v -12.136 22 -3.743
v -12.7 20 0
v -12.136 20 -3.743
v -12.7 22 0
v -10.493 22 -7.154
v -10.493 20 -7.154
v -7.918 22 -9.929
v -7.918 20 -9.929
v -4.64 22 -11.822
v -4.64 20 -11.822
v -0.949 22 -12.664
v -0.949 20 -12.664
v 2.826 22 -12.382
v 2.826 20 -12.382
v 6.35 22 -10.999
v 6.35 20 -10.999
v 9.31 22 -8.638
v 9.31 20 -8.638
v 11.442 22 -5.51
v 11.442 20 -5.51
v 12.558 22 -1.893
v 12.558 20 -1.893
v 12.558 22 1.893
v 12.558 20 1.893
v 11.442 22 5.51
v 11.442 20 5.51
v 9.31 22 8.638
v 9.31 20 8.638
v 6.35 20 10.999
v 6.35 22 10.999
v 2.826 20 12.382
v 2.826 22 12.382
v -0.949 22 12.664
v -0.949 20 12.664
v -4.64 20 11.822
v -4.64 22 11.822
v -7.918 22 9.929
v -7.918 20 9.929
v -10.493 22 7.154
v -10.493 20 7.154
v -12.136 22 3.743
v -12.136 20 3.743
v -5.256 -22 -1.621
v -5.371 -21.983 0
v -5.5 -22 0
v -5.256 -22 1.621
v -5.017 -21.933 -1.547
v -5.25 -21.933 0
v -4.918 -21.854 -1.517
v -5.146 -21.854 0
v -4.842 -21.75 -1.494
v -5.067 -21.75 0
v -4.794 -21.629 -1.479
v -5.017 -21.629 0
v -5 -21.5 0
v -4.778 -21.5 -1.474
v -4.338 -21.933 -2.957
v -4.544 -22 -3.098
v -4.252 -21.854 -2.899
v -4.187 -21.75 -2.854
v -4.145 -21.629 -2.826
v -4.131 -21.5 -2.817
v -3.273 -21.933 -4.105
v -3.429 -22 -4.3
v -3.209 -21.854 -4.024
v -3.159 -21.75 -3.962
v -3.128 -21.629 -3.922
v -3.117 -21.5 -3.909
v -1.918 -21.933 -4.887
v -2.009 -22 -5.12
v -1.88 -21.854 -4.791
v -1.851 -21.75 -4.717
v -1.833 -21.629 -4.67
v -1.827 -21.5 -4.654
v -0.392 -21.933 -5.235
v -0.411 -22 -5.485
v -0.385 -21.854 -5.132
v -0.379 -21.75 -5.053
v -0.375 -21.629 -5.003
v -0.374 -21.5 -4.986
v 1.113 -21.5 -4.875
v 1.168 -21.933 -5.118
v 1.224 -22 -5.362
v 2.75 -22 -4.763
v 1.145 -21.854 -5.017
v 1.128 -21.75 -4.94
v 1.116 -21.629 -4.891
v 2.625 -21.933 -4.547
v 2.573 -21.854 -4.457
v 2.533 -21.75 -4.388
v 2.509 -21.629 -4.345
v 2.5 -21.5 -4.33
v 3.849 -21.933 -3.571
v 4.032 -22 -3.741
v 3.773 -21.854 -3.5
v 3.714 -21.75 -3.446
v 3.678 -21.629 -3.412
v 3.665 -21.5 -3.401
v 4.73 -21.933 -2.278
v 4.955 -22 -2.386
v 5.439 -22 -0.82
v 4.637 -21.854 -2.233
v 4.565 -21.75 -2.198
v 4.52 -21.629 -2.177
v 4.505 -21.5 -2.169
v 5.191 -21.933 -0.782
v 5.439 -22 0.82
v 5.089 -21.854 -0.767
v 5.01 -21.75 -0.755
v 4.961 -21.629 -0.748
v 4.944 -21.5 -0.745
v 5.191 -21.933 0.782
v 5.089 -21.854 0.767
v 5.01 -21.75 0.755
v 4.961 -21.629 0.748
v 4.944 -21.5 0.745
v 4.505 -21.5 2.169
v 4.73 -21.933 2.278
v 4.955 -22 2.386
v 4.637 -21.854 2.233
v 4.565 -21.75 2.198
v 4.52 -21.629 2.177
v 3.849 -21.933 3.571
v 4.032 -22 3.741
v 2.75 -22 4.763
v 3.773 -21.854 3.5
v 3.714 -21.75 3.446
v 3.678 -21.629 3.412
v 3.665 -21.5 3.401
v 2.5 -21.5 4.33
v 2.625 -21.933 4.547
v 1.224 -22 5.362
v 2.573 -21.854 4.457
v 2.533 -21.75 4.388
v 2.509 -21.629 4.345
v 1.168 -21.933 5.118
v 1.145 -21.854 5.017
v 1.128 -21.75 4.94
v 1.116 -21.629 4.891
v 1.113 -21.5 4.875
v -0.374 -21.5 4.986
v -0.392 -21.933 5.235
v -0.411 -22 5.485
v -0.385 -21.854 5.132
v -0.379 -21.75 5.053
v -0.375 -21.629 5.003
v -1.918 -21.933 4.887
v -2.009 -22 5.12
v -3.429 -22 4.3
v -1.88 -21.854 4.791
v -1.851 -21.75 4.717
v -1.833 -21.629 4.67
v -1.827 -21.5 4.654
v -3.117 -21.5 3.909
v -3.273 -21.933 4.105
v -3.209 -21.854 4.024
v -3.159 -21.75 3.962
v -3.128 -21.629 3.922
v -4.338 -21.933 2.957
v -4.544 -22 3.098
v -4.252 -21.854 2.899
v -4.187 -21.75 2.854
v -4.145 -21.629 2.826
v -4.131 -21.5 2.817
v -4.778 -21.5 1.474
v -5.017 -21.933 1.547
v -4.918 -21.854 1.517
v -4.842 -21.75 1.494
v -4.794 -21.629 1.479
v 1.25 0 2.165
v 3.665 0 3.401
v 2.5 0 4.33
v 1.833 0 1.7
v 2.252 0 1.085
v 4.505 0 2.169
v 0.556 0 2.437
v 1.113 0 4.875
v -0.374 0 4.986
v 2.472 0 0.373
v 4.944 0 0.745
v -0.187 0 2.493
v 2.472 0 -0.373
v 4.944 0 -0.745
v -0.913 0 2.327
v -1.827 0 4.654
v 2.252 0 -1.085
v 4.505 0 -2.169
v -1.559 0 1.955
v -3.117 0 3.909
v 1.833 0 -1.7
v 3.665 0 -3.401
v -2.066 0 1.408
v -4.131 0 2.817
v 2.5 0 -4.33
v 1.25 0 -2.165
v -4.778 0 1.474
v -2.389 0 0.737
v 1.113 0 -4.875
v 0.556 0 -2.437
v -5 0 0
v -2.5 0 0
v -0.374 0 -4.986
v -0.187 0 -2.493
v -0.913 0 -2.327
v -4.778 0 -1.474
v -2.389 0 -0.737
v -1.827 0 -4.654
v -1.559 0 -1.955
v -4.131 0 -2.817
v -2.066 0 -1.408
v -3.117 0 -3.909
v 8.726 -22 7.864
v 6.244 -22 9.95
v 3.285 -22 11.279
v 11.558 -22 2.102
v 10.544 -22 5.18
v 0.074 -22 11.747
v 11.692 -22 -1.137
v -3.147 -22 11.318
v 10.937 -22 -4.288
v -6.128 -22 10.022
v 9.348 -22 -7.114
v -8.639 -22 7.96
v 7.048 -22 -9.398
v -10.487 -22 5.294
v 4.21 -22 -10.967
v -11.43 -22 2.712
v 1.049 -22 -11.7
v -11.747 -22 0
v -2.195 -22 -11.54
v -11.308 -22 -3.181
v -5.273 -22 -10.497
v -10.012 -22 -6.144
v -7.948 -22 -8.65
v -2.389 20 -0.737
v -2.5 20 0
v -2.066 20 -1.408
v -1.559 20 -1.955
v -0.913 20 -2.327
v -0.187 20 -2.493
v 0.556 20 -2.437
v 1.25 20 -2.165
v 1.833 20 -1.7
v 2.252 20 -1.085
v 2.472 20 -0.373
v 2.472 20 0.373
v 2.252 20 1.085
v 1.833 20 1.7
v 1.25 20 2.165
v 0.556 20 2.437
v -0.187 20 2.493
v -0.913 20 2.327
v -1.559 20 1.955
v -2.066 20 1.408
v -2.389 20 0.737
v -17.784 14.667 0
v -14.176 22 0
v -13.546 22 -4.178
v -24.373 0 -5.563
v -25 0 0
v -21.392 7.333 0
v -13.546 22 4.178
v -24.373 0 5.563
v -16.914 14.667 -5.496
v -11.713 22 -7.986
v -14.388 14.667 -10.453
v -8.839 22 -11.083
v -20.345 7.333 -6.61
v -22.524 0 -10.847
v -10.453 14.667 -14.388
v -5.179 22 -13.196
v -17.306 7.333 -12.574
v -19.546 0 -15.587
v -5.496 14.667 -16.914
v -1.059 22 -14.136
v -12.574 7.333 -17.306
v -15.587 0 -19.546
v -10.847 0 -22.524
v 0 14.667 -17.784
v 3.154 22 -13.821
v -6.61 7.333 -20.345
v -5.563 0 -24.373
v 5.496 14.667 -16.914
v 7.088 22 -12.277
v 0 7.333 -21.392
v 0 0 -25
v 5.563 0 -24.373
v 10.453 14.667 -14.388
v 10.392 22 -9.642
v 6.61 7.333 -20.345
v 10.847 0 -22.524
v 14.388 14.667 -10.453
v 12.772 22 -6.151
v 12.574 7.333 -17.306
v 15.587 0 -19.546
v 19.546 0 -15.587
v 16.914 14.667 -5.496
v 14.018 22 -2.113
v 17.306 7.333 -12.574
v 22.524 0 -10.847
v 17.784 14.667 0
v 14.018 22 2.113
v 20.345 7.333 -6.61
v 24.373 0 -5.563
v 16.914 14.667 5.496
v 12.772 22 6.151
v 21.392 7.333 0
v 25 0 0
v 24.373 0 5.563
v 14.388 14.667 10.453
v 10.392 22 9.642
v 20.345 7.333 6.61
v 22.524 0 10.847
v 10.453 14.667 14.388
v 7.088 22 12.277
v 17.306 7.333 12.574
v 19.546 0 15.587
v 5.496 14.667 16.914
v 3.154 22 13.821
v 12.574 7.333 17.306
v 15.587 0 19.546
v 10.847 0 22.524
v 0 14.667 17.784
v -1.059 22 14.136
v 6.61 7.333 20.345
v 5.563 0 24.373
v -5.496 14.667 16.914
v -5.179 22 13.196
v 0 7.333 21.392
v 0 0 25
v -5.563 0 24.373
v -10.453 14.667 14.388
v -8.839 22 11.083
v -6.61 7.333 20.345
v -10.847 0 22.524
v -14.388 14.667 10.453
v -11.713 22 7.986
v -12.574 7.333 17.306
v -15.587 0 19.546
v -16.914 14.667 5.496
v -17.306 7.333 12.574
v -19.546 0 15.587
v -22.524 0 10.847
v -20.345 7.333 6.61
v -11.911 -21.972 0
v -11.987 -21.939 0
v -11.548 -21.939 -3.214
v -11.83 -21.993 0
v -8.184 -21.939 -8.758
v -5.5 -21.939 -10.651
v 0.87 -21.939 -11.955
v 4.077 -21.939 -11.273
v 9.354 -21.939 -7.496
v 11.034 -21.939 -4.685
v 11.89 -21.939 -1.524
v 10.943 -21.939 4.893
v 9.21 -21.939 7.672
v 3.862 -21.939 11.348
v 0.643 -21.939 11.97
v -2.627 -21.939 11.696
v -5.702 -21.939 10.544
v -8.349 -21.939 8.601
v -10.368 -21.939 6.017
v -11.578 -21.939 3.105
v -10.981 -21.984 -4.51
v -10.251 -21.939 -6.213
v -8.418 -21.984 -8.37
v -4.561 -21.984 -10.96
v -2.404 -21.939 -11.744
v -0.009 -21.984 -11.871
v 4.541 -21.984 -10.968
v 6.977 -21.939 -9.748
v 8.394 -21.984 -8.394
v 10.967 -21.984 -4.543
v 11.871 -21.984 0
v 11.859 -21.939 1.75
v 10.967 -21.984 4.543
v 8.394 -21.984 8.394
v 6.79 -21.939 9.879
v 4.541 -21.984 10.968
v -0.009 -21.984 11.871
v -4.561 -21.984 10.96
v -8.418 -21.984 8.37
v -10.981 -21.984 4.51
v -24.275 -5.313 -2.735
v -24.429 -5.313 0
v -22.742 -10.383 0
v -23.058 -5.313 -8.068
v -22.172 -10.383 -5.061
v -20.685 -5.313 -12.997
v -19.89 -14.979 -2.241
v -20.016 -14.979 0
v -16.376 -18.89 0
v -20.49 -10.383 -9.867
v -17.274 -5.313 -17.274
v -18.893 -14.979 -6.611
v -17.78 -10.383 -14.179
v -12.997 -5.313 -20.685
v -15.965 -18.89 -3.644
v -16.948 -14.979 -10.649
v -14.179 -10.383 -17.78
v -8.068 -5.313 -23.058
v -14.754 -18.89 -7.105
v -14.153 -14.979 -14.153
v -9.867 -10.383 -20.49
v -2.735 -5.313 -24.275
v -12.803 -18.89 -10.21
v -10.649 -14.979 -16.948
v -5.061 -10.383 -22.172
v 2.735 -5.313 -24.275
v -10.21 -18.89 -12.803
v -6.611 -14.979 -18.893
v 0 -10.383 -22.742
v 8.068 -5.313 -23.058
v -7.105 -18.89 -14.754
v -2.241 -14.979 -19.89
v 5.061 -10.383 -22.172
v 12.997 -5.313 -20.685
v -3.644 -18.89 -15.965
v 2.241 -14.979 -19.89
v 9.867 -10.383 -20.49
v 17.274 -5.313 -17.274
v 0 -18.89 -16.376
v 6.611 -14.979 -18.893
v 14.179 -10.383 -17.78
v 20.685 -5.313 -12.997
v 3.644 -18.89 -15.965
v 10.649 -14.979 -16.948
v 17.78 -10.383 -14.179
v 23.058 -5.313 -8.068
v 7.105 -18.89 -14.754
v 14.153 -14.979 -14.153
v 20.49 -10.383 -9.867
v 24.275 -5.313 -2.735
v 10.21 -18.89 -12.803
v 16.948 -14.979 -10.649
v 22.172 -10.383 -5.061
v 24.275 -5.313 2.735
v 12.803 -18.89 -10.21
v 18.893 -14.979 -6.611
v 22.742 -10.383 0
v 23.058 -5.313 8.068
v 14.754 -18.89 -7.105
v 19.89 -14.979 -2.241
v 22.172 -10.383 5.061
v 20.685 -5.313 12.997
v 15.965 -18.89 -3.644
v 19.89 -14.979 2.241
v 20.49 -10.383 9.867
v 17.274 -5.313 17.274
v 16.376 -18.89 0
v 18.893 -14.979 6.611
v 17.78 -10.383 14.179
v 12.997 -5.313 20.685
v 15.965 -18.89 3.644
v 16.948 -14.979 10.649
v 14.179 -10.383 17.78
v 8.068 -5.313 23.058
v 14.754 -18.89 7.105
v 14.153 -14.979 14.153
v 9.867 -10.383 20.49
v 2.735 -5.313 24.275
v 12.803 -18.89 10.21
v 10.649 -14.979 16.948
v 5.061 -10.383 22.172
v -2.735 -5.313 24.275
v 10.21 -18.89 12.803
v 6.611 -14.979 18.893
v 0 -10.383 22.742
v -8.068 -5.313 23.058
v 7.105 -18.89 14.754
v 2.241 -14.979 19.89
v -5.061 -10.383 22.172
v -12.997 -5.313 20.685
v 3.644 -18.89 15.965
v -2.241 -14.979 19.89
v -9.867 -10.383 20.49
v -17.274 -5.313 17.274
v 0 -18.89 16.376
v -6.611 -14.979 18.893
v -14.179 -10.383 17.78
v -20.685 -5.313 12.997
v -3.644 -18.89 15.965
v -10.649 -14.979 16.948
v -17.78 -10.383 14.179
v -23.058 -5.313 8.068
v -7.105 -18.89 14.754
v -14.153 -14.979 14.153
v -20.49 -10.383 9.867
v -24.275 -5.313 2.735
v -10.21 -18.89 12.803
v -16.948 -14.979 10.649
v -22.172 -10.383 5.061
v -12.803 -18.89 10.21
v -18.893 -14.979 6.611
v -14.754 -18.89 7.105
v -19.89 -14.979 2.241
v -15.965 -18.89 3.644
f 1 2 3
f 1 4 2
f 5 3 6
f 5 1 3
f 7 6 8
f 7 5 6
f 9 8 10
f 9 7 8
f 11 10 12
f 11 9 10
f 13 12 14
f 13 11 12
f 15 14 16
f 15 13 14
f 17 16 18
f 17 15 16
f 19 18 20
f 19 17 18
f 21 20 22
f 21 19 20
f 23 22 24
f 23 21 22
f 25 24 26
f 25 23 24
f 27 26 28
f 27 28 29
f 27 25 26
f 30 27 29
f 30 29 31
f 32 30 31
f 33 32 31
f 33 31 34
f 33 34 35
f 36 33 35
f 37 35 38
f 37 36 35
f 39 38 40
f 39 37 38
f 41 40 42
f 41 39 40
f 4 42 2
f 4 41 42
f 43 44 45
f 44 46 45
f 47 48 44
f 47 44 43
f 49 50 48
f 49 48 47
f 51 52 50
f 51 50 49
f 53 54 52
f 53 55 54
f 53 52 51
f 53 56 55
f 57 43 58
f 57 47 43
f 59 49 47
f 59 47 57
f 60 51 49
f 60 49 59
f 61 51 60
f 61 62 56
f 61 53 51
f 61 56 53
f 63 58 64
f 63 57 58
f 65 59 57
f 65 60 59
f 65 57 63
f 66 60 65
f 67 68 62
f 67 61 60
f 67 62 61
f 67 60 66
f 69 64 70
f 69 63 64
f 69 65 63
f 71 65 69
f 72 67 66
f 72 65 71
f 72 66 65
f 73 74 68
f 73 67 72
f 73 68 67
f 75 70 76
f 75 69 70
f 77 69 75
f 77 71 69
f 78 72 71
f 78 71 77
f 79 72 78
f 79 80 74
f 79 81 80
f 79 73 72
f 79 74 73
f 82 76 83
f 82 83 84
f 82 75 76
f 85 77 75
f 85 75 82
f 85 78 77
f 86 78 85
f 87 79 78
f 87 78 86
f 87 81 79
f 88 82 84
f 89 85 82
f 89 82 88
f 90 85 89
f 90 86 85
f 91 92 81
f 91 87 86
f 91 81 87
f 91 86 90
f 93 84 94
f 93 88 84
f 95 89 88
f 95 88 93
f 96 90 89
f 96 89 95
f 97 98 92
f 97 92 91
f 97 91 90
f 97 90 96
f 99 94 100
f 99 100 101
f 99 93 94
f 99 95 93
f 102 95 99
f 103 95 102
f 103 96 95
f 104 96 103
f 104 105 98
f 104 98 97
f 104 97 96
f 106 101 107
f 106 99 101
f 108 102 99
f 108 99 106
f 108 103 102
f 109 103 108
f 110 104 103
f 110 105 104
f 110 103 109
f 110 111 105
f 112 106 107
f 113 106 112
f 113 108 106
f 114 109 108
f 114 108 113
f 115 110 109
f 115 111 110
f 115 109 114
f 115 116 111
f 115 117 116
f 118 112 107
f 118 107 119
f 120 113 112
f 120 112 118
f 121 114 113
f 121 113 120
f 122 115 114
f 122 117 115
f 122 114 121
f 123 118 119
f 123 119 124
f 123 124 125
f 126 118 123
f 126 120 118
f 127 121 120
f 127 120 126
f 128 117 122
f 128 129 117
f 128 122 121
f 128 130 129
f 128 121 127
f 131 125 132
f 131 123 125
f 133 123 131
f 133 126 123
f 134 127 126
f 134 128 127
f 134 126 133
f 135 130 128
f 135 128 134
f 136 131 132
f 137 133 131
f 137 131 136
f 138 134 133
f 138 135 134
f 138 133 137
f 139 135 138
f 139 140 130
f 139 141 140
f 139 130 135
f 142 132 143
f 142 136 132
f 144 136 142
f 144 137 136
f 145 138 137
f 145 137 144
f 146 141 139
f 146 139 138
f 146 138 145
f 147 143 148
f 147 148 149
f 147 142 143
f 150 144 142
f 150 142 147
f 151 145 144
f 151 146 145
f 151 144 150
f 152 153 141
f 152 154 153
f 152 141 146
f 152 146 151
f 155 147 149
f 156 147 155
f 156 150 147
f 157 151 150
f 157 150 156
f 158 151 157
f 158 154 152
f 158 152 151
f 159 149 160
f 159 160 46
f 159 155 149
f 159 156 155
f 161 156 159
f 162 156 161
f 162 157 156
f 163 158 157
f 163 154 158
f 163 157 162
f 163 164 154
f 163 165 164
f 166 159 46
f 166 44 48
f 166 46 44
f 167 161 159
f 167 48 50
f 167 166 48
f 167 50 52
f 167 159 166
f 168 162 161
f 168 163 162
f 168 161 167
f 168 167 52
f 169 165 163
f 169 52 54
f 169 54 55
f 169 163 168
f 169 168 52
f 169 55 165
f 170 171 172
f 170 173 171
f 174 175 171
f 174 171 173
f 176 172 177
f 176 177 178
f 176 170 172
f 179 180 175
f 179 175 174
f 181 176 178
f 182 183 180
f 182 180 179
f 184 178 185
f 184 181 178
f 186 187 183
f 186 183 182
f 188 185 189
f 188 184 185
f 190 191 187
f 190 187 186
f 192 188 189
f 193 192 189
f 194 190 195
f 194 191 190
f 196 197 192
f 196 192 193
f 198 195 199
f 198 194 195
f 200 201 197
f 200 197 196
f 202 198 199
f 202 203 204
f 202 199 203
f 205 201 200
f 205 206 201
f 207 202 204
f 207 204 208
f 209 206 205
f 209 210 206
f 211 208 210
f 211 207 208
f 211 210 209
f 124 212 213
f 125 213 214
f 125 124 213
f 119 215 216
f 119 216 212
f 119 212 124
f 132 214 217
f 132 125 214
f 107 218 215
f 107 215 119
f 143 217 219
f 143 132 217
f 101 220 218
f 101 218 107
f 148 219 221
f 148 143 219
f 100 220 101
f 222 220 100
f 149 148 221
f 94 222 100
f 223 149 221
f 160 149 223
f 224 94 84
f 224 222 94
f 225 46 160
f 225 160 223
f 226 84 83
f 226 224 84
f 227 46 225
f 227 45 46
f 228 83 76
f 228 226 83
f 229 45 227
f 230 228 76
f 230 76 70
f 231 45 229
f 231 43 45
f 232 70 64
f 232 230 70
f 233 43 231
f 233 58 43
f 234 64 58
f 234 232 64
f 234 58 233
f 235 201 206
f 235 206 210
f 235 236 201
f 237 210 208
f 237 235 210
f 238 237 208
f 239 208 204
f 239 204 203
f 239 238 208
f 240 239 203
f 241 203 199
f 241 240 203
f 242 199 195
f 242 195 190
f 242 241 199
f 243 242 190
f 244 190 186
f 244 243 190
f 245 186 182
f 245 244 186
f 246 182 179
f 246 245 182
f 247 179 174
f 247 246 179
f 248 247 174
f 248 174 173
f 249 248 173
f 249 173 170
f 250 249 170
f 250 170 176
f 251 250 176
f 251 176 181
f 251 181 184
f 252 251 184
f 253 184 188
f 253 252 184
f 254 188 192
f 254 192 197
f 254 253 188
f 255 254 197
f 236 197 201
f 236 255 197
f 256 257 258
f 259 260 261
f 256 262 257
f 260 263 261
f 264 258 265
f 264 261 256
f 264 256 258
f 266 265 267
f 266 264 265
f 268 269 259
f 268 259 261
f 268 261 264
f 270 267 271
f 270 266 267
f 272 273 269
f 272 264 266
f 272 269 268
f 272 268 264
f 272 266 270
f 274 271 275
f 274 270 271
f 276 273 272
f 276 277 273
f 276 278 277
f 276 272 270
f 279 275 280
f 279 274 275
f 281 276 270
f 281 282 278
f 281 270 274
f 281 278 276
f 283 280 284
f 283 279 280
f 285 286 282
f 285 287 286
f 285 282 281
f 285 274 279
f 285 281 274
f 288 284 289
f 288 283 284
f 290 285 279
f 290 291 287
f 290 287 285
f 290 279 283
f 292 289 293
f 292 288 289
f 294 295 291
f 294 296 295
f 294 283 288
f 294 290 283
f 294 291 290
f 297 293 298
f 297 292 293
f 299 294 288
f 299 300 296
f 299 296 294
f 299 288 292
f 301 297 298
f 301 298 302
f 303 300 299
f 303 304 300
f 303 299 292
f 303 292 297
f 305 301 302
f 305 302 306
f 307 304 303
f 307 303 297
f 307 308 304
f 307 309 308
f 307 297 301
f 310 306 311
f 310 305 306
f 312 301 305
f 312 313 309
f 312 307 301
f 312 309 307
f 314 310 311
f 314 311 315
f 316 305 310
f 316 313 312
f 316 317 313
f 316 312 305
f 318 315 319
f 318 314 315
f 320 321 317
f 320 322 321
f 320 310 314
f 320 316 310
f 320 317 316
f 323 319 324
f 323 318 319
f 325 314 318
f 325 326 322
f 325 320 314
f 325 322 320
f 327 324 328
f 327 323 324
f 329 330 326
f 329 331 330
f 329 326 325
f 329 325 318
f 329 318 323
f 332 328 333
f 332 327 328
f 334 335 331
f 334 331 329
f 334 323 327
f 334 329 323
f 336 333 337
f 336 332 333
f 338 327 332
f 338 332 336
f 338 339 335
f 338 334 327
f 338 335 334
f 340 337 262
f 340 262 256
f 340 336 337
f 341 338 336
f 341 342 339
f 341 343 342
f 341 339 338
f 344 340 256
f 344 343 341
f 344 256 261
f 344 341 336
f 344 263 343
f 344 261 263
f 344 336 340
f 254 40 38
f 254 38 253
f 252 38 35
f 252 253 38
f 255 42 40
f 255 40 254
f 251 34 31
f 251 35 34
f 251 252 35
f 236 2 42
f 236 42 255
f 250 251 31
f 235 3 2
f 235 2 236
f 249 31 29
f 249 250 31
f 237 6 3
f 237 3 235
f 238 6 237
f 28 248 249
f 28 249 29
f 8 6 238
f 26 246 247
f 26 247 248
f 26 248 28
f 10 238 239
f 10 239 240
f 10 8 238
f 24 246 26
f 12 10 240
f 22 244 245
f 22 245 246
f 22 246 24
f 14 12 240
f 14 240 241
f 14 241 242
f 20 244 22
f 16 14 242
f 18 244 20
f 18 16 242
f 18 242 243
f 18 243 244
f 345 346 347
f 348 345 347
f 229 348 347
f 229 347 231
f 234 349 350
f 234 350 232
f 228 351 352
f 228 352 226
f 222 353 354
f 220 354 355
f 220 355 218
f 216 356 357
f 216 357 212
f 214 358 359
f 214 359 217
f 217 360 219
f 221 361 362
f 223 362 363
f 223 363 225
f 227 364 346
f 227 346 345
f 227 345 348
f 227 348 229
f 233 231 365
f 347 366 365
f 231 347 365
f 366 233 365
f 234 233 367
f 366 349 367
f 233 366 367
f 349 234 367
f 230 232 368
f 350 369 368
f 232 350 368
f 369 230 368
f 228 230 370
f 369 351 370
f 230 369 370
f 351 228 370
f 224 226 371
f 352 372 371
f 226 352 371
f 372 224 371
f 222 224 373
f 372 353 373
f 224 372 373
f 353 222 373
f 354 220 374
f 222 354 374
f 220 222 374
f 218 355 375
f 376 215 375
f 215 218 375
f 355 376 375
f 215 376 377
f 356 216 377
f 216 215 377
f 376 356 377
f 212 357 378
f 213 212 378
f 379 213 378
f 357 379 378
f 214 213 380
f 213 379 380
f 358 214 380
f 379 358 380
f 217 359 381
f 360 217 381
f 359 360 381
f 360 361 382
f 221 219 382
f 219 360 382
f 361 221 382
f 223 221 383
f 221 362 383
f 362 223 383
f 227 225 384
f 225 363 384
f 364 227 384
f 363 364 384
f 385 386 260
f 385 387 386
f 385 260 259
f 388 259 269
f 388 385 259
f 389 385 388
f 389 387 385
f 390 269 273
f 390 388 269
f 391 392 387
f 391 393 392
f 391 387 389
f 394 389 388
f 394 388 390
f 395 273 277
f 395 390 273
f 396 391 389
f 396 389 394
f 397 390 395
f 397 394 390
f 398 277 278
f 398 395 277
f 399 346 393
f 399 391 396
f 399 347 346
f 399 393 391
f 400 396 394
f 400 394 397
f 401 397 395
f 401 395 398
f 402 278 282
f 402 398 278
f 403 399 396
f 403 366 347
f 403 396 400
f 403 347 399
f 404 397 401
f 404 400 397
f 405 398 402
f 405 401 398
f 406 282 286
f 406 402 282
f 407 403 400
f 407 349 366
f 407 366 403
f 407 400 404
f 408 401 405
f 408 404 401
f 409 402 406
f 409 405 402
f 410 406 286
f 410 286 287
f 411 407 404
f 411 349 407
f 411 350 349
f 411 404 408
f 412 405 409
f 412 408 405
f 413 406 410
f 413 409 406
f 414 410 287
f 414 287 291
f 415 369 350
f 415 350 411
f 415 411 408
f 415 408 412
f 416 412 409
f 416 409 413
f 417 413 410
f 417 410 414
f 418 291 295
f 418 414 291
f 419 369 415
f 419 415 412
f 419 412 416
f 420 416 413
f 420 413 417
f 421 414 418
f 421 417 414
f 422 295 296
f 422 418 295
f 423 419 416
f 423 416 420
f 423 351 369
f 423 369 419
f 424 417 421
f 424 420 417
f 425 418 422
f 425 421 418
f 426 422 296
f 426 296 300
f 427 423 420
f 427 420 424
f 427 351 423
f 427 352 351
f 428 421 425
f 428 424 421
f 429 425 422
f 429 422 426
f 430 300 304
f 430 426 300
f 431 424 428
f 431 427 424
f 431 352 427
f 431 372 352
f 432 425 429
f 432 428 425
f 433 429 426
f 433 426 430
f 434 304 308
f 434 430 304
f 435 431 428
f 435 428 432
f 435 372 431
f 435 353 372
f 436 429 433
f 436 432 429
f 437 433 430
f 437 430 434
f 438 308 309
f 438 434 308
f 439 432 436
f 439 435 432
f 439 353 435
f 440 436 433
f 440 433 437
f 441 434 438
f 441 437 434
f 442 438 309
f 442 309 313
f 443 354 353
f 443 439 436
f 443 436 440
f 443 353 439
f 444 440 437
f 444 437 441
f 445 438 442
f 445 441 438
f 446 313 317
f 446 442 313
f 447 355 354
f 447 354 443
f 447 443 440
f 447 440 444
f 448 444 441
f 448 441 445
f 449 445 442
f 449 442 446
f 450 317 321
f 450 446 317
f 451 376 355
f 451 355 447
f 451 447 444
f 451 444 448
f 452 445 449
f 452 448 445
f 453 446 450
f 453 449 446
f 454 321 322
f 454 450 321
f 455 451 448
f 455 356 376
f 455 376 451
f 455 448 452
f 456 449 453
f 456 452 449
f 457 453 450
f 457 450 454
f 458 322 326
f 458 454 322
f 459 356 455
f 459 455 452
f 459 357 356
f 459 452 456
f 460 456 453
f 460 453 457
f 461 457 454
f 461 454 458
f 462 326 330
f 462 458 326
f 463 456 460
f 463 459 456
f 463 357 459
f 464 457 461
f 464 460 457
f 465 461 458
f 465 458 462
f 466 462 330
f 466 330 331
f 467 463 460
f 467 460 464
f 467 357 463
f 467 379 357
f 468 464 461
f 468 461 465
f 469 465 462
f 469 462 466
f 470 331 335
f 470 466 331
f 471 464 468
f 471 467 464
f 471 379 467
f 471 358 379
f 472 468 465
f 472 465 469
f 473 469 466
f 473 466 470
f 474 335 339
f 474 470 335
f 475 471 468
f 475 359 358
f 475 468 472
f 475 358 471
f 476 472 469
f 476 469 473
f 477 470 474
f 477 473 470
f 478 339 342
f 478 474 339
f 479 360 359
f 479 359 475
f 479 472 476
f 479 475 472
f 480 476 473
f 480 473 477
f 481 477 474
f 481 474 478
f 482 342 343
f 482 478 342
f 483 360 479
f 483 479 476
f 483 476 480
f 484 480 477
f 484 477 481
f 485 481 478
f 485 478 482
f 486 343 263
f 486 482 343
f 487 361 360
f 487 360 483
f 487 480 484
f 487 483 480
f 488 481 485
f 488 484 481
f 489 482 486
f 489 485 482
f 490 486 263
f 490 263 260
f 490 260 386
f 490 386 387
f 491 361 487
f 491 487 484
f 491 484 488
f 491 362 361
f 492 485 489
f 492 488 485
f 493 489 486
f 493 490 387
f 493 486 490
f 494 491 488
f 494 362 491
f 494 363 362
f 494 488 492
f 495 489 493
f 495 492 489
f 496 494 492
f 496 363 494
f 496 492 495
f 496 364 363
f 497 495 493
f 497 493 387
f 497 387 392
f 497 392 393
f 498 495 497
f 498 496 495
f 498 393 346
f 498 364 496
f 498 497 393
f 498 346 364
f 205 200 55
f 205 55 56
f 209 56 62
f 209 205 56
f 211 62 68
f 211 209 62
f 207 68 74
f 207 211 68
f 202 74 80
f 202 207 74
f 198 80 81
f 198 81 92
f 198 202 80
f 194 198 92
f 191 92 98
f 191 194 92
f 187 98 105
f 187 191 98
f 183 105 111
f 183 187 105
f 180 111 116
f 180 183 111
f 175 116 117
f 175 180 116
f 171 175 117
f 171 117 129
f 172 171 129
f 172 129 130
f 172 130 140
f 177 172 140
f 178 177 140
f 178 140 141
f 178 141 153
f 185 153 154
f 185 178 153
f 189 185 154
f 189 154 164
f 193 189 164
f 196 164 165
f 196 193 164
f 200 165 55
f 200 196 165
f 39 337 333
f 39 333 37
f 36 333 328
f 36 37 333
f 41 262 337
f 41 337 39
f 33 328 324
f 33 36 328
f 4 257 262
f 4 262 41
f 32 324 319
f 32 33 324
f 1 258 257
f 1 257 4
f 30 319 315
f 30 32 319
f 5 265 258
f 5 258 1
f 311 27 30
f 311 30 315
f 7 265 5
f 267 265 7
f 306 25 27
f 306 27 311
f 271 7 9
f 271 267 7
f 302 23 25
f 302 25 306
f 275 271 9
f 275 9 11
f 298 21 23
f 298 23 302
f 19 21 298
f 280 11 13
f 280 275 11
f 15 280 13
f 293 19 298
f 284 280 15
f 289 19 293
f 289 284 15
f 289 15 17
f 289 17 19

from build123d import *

# Parameters (mm, degrees)
FILLET1_R = 0.5


with BuildPart() as part:
    # Sketch1 → Revolve1 (revolve)
    with BuildSketch(Plane.XY):
        with BuildLine():
            Line((-14.176, 22), (-25, 0))
            ThreePointArc((-25, 0), (-21.46926352, -12.809009482), (-11.874342087, -22))
            Line((-11.874342087, -22), (-5, -22))
            Line((-5, -22), (-5, 0))
            Line((-5, 0), (-2.5, 0))
            Line((-2.5, 0), (-2.5, 20))
            Line((-2.5, 20), (-12.7, 20))
            Line((-12.7, 20), (-12.7, 22))
            Line((-12.7, 22), (-14.176, 22))
        make_face()
    revolve(axis=Axis((0, 0, 0), (0, -1, 0)))

    # Fillet1
    fillet1_edges = [part.edges().sort_by_distance(p)[0] for p in [
        (5, -22, 0),
        (11.874342087, -22, 0),
    ]]
    fillet(fillet1_edges, radius=FILLET1_R)


solid = part.part
